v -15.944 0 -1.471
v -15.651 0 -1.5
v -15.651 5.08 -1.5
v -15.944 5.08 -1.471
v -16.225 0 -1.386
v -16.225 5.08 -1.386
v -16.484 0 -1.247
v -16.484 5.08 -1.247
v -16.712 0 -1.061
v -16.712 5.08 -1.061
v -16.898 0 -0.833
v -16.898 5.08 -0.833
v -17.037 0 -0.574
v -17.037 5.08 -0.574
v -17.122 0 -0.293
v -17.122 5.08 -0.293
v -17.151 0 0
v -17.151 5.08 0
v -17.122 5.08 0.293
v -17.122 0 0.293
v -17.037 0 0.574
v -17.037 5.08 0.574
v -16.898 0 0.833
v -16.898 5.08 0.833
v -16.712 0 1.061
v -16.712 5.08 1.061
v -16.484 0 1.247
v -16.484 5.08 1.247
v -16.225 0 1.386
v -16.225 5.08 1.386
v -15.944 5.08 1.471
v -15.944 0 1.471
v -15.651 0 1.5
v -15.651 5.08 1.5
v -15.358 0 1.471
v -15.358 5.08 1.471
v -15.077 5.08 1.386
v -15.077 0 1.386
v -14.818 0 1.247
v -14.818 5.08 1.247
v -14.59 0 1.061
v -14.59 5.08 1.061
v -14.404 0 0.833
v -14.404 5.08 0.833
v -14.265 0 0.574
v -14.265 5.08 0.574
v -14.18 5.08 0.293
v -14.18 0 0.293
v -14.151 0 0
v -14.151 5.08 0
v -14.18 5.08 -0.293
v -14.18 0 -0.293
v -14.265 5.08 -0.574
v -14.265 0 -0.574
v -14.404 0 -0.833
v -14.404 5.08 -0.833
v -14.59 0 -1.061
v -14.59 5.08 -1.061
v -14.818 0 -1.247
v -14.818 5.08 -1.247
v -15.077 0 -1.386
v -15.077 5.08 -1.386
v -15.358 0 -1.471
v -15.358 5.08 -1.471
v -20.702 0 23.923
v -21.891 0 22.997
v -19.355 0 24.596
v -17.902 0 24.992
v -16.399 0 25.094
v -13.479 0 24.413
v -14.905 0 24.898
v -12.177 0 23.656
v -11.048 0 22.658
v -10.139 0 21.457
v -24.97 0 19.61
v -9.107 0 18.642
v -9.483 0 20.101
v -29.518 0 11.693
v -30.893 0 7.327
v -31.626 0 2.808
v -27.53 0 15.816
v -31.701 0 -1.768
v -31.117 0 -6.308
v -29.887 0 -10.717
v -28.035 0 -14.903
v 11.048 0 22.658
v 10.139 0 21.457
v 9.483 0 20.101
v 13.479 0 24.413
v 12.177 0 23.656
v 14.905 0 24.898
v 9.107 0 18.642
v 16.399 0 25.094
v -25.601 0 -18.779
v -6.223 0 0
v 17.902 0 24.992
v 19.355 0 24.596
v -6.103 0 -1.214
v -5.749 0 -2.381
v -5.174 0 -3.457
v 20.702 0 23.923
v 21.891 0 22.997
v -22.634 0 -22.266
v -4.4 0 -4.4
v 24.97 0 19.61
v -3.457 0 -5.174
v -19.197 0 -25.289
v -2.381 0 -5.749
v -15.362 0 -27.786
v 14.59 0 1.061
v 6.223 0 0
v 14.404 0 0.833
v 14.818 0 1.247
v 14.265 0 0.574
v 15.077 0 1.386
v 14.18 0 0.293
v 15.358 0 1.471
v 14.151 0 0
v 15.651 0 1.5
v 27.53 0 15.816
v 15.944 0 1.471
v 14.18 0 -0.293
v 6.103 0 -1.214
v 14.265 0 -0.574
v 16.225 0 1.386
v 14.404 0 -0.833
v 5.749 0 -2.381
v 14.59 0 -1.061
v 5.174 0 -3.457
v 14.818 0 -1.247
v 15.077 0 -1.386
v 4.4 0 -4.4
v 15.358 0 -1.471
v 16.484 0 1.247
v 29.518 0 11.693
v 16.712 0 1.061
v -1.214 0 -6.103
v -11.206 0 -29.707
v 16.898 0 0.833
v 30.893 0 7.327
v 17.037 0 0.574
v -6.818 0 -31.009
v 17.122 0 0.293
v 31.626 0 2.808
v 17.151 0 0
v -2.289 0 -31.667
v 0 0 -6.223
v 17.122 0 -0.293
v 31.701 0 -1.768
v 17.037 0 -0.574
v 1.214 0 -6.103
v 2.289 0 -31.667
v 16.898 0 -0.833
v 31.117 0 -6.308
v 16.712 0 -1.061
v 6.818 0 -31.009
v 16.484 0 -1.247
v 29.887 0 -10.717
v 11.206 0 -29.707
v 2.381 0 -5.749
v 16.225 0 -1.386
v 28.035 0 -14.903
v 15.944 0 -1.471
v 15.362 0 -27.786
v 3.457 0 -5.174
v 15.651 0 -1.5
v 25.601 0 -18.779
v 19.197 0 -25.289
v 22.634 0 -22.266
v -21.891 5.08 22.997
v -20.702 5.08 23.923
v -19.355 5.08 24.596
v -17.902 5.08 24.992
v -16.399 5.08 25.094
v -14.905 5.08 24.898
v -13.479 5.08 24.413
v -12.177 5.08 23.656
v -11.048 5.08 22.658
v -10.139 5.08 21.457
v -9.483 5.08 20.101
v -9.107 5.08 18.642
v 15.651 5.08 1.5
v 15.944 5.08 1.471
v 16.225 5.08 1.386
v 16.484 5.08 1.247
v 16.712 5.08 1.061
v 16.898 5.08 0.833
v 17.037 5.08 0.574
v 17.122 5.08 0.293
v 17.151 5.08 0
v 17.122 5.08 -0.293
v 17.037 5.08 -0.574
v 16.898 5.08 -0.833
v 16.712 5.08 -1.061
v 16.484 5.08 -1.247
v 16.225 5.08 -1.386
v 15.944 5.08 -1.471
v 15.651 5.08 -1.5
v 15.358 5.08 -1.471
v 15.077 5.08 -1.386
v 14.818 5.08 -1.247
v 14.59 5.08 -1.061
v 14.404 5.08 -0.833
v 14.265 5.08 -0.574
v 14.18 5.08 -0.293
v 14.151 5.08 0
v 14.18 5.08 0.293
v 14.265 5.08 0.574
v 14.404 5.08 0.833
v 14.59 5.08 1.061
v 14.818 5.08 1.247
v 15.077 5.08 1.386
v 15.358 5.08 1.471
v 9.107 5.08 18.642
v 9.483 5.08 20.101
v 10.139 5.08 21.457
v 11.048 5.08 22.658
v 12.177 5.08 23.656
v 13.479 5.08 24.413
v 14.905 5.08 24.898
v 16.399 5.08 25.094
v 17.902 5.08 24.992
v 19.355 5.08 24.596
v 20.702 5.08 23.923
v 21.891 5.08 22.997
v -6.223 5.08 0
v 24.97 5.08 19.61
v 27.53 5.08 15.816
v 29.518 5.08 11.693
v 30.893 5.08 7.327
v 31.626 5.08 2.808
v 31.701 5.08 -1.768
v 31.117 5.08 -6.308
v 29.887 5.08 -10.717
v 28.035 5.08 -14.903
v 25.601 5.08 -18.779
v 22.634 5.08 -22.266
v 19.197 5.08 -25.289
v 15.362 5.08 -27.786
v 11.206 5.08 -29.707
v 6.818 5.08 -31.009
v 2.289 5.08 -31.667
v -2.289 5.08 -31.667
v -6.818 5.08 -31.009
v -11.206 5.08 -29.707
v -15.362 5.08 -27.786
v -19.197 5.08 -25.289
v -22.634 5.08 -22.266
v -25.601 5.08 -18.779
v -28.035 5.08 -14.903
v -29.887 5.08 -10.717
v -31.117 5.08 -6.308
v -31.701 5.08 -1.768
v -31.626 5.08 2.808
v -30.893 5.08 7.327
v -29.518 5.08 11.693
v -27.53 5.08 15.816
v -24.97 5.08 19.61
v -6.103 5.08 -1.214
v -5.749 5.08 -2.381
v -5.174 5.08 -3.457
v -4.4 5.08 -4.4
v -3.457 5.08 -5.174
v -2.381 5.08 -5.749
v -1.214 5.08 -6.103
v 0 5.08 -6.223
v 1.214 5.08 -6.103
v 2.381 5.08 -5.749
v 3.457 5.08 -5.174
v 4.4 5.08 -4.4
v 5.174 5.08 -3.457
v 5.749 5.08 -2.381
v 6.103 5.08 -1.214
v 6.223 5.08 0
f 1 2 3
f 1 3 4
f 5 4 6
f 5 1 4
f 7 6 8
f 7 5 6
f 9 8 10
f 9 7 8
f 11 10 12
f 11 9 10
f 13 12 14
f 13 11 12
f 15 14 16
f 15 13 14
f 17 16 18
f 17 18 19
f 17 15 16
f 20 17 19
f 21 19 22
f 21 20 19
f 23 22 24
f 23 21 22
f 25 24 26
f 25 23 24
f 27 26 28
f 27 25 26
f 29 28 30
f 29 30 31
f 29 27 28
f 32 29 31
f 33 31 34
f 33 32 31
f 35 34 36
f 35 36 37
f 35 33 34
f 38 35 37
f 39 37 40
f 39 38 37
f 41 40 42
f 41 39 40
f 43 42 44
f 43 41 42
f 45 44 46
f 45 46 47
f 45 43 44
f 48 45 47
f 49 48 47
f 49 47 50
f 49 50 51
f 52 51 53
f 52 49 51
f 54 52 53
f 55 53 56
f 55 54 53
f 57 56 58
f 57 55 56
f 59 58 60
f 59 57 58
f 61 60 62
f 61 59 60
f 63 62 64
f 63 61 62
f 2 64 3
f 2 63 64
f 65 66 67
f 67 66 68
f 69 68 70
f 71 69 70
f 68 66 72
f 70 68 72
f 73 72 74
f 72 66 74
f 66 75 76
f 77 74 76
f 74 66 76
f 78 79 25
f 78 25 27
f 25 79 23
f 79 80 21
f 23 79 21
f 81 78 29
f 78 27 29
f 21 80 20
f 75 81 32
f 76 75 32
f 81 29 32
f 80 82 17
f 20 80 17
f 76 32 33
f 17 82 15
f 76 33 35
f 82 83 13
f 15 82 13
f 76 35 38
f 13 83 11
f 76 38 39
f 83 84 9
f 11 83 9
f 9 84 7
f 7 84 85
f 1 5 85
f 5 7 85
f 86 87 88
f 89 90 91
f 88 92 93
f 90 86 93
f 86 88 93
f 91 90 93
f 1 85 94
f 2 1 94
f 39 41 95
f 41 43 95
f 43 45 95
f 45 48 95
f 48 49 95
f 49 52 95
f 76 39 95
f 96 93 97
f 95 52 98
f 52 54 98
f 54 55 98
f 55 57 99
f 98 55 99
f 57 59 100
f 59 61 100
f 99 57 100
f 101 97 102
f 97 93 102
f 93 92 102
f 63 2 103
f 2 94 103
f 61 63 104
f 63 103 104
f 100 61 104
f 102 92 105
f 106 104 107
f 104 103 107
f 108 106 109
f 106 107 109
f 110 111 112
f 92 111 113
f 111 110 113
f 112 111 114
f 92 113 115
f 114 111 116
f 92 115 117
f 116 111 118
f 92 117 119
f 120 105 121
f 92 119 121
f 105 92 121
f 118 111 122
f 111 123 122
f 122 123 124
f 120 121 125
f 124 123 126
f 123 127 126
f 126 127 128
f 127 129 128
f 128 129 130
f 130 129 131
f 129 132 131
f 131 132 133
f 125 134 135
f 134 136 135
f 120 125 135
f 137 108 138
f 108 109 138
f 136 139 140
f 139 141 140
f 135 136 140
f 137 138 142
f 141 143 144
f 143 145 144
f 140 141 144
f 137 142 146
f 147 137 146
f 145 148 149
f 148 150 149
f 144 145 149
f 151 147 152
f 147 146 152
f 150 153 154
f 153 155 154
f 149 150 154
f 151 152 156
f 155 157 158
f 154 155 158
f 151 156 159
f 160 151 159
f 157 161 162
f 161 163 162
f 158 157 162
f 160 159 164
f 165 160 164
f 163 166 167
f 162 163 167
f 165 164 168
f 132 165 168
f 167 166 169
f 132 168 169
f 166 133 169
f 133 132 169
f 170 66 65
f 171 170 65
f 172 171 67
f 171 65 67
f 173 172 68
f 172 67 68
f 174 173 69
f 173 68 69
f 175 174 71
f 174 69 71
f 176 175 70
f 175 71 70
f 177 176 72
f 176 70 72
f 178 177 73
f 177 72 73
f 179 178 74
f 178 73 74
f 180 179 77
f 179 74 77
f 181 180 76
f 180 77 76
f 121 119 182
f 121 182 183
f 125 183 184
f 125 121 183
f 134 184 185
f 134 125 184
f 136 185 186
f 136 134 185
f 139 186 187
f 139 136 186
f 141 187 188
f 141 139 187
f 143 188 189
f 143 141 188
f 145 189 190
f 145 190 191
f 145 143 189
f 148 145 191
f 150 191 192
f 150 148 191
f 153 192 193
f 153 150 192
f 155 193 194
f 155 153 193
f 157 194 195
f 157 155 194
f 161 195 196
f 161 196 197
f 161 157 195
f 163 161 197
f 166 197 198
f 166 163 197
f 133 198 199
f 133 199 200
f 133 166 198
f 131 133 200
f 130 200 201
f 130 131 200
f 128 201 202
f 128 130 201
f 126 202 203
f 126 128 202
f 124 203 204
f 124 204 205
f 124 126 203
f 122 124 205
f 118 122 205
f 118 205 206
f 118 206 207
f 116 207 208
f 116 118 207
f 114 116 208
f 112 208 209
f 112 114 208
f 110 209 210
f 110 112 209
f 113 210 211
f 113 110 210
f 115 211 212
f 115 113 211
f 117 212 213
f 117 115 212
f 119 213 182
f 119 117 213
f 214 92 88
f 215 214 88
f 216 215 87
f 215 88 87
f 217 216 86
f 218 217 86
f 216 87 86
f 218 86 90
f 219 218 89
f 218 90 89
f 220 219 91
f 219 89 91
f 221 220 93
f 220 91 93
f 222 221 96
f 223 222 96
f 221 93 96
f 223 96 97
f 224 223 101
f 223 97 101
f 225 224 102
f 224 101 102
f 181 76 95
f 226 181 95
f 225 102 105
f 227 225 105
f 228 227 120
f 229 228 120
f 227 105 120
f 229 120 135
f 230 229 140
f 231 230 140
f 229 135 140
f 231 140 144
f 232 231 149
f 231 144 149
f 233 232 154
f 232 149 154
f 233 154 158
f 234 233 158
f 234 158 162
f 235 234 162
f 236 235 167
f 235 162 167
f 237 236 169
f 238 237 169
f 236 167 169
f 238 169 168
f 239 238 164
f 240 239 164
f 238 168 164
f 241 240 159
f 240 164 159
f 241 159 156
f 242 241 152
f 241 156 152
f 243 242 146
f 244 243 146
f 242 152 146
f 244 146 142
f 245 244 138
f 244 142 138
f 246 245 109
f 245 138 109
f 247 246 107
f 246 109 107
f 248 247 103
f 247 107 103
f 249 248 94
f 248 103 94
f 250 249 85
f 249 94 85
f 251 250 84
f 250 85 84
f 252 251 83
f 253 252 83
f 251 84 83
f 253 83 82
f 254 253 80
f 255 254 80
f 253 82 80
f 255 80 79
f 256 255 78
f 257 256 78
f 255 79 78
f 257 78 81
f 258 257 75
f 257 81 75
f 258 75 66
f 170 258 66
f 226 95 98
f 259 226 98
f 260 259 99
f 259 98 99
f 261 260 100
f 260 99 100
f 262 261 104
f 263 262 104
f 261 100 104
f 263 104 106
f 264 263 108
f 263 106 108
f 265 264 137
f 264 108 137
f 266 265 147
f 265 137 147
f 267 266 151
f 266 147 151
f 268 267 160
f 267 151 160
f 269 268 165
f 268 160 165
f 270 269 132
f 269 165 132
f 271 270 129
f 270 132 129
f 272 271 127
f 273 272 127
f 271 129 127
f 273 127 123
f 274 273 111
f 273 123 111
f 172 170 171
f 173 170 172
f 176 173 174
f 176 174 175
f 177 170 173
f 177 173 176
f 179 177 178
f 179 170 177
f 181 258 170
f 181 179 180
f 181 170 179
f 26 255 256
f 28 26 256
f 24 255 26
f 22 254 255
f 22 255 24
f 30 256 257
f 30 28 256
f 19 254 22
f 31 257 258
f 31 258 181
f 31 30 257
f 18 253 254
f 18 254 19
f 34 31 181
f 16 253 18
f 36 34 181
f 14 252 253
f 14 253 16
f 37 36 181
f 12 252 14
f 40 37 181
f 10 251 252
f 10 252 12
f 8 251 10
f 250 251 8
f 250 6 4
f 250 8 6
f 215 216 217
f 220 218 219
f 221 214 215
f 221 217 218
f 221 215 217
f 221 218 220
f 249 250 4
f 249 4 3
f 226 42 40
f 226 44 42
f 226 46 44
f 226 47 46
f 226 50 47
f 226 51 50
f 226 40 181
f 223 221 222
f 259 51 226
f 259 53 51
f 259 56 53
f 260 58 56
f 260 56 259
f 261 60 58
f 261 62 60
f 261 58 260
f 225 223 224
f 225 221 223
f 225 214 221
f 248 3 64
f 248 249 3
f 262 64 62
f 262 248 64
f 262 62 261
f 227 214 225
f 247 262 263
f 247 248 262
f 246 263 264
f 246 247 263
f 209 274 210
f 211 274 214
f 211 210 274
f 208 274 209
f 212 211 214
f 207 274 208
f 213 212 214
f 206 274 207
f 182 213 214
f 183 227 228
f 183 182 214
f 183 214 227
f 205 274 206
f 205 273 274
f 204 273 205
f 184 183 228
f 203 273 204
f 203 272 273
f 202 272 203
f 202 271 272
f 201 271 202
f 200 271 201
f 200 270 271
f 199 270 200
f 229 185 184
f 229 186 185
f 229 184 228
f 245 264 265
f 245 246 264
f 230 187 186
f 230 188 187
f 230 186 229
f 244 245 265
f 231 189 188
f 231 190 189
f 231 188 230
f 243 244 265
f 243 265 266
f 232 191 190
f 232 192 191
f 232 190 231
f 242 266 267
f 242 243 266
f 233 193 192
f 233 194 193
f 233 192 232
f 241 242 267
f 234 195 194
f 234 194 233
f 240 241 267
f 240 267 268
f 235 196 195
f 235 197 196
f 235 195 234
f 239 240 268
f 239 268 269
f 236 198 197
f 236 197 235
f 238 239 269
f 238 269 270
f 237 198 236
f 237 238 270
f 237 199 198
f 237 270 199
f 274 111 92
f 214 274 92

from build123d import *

# Parameters (mm, degrees)
SKETCH1_R           = 1.5
BOSS_EXTRUDE1_DEPTH = 5.08


with BuildPart() as part:
    # Sketch1 → Boss-Extrude1 (new body)
    with BuildSketch(Plane(origin=(0, 0, 0), x_dir=(1, 0, 0), z_dir=(0, 1, 0))):
        with BuildLine():
            Line((6.223, 0), (9.106543772, -18.642408089))
            ThreePointArc((9.106543772, -18.642408089), (14.180138014, -24.690685628), (21.89078133, -22.996873543))
            ThreePointArc((21.89078133, -22.996873543), (0, 31.75), (-21.89078133, -22.996873543))
            ThreePointArc((-21.89078133, -22.996873543), (-14.180138014, -24.690685628), (-9.106543772, -18.642408089))
            Line((-9.106543772, -18.642408089), (-6.223, 0))
            ThreePointArc((-6.223, 0), (0, 6.223), (6.223, 0))
        make_face()
        with Locations(Location((15.65097218, 0, 0), (0, 0, 270))):
            Circle(SKETCH1_R, mode=Mode.SUBTRACT)
        with Locations(Location((-15.65097218, 0, 0), (0, 0, 90))):
            Circle(SKETCH1_R, mode=Mode.SUBTRACT)
    extrude(amount=BOSS_EXTRUDE1_DEPTH)


solid = part.part
